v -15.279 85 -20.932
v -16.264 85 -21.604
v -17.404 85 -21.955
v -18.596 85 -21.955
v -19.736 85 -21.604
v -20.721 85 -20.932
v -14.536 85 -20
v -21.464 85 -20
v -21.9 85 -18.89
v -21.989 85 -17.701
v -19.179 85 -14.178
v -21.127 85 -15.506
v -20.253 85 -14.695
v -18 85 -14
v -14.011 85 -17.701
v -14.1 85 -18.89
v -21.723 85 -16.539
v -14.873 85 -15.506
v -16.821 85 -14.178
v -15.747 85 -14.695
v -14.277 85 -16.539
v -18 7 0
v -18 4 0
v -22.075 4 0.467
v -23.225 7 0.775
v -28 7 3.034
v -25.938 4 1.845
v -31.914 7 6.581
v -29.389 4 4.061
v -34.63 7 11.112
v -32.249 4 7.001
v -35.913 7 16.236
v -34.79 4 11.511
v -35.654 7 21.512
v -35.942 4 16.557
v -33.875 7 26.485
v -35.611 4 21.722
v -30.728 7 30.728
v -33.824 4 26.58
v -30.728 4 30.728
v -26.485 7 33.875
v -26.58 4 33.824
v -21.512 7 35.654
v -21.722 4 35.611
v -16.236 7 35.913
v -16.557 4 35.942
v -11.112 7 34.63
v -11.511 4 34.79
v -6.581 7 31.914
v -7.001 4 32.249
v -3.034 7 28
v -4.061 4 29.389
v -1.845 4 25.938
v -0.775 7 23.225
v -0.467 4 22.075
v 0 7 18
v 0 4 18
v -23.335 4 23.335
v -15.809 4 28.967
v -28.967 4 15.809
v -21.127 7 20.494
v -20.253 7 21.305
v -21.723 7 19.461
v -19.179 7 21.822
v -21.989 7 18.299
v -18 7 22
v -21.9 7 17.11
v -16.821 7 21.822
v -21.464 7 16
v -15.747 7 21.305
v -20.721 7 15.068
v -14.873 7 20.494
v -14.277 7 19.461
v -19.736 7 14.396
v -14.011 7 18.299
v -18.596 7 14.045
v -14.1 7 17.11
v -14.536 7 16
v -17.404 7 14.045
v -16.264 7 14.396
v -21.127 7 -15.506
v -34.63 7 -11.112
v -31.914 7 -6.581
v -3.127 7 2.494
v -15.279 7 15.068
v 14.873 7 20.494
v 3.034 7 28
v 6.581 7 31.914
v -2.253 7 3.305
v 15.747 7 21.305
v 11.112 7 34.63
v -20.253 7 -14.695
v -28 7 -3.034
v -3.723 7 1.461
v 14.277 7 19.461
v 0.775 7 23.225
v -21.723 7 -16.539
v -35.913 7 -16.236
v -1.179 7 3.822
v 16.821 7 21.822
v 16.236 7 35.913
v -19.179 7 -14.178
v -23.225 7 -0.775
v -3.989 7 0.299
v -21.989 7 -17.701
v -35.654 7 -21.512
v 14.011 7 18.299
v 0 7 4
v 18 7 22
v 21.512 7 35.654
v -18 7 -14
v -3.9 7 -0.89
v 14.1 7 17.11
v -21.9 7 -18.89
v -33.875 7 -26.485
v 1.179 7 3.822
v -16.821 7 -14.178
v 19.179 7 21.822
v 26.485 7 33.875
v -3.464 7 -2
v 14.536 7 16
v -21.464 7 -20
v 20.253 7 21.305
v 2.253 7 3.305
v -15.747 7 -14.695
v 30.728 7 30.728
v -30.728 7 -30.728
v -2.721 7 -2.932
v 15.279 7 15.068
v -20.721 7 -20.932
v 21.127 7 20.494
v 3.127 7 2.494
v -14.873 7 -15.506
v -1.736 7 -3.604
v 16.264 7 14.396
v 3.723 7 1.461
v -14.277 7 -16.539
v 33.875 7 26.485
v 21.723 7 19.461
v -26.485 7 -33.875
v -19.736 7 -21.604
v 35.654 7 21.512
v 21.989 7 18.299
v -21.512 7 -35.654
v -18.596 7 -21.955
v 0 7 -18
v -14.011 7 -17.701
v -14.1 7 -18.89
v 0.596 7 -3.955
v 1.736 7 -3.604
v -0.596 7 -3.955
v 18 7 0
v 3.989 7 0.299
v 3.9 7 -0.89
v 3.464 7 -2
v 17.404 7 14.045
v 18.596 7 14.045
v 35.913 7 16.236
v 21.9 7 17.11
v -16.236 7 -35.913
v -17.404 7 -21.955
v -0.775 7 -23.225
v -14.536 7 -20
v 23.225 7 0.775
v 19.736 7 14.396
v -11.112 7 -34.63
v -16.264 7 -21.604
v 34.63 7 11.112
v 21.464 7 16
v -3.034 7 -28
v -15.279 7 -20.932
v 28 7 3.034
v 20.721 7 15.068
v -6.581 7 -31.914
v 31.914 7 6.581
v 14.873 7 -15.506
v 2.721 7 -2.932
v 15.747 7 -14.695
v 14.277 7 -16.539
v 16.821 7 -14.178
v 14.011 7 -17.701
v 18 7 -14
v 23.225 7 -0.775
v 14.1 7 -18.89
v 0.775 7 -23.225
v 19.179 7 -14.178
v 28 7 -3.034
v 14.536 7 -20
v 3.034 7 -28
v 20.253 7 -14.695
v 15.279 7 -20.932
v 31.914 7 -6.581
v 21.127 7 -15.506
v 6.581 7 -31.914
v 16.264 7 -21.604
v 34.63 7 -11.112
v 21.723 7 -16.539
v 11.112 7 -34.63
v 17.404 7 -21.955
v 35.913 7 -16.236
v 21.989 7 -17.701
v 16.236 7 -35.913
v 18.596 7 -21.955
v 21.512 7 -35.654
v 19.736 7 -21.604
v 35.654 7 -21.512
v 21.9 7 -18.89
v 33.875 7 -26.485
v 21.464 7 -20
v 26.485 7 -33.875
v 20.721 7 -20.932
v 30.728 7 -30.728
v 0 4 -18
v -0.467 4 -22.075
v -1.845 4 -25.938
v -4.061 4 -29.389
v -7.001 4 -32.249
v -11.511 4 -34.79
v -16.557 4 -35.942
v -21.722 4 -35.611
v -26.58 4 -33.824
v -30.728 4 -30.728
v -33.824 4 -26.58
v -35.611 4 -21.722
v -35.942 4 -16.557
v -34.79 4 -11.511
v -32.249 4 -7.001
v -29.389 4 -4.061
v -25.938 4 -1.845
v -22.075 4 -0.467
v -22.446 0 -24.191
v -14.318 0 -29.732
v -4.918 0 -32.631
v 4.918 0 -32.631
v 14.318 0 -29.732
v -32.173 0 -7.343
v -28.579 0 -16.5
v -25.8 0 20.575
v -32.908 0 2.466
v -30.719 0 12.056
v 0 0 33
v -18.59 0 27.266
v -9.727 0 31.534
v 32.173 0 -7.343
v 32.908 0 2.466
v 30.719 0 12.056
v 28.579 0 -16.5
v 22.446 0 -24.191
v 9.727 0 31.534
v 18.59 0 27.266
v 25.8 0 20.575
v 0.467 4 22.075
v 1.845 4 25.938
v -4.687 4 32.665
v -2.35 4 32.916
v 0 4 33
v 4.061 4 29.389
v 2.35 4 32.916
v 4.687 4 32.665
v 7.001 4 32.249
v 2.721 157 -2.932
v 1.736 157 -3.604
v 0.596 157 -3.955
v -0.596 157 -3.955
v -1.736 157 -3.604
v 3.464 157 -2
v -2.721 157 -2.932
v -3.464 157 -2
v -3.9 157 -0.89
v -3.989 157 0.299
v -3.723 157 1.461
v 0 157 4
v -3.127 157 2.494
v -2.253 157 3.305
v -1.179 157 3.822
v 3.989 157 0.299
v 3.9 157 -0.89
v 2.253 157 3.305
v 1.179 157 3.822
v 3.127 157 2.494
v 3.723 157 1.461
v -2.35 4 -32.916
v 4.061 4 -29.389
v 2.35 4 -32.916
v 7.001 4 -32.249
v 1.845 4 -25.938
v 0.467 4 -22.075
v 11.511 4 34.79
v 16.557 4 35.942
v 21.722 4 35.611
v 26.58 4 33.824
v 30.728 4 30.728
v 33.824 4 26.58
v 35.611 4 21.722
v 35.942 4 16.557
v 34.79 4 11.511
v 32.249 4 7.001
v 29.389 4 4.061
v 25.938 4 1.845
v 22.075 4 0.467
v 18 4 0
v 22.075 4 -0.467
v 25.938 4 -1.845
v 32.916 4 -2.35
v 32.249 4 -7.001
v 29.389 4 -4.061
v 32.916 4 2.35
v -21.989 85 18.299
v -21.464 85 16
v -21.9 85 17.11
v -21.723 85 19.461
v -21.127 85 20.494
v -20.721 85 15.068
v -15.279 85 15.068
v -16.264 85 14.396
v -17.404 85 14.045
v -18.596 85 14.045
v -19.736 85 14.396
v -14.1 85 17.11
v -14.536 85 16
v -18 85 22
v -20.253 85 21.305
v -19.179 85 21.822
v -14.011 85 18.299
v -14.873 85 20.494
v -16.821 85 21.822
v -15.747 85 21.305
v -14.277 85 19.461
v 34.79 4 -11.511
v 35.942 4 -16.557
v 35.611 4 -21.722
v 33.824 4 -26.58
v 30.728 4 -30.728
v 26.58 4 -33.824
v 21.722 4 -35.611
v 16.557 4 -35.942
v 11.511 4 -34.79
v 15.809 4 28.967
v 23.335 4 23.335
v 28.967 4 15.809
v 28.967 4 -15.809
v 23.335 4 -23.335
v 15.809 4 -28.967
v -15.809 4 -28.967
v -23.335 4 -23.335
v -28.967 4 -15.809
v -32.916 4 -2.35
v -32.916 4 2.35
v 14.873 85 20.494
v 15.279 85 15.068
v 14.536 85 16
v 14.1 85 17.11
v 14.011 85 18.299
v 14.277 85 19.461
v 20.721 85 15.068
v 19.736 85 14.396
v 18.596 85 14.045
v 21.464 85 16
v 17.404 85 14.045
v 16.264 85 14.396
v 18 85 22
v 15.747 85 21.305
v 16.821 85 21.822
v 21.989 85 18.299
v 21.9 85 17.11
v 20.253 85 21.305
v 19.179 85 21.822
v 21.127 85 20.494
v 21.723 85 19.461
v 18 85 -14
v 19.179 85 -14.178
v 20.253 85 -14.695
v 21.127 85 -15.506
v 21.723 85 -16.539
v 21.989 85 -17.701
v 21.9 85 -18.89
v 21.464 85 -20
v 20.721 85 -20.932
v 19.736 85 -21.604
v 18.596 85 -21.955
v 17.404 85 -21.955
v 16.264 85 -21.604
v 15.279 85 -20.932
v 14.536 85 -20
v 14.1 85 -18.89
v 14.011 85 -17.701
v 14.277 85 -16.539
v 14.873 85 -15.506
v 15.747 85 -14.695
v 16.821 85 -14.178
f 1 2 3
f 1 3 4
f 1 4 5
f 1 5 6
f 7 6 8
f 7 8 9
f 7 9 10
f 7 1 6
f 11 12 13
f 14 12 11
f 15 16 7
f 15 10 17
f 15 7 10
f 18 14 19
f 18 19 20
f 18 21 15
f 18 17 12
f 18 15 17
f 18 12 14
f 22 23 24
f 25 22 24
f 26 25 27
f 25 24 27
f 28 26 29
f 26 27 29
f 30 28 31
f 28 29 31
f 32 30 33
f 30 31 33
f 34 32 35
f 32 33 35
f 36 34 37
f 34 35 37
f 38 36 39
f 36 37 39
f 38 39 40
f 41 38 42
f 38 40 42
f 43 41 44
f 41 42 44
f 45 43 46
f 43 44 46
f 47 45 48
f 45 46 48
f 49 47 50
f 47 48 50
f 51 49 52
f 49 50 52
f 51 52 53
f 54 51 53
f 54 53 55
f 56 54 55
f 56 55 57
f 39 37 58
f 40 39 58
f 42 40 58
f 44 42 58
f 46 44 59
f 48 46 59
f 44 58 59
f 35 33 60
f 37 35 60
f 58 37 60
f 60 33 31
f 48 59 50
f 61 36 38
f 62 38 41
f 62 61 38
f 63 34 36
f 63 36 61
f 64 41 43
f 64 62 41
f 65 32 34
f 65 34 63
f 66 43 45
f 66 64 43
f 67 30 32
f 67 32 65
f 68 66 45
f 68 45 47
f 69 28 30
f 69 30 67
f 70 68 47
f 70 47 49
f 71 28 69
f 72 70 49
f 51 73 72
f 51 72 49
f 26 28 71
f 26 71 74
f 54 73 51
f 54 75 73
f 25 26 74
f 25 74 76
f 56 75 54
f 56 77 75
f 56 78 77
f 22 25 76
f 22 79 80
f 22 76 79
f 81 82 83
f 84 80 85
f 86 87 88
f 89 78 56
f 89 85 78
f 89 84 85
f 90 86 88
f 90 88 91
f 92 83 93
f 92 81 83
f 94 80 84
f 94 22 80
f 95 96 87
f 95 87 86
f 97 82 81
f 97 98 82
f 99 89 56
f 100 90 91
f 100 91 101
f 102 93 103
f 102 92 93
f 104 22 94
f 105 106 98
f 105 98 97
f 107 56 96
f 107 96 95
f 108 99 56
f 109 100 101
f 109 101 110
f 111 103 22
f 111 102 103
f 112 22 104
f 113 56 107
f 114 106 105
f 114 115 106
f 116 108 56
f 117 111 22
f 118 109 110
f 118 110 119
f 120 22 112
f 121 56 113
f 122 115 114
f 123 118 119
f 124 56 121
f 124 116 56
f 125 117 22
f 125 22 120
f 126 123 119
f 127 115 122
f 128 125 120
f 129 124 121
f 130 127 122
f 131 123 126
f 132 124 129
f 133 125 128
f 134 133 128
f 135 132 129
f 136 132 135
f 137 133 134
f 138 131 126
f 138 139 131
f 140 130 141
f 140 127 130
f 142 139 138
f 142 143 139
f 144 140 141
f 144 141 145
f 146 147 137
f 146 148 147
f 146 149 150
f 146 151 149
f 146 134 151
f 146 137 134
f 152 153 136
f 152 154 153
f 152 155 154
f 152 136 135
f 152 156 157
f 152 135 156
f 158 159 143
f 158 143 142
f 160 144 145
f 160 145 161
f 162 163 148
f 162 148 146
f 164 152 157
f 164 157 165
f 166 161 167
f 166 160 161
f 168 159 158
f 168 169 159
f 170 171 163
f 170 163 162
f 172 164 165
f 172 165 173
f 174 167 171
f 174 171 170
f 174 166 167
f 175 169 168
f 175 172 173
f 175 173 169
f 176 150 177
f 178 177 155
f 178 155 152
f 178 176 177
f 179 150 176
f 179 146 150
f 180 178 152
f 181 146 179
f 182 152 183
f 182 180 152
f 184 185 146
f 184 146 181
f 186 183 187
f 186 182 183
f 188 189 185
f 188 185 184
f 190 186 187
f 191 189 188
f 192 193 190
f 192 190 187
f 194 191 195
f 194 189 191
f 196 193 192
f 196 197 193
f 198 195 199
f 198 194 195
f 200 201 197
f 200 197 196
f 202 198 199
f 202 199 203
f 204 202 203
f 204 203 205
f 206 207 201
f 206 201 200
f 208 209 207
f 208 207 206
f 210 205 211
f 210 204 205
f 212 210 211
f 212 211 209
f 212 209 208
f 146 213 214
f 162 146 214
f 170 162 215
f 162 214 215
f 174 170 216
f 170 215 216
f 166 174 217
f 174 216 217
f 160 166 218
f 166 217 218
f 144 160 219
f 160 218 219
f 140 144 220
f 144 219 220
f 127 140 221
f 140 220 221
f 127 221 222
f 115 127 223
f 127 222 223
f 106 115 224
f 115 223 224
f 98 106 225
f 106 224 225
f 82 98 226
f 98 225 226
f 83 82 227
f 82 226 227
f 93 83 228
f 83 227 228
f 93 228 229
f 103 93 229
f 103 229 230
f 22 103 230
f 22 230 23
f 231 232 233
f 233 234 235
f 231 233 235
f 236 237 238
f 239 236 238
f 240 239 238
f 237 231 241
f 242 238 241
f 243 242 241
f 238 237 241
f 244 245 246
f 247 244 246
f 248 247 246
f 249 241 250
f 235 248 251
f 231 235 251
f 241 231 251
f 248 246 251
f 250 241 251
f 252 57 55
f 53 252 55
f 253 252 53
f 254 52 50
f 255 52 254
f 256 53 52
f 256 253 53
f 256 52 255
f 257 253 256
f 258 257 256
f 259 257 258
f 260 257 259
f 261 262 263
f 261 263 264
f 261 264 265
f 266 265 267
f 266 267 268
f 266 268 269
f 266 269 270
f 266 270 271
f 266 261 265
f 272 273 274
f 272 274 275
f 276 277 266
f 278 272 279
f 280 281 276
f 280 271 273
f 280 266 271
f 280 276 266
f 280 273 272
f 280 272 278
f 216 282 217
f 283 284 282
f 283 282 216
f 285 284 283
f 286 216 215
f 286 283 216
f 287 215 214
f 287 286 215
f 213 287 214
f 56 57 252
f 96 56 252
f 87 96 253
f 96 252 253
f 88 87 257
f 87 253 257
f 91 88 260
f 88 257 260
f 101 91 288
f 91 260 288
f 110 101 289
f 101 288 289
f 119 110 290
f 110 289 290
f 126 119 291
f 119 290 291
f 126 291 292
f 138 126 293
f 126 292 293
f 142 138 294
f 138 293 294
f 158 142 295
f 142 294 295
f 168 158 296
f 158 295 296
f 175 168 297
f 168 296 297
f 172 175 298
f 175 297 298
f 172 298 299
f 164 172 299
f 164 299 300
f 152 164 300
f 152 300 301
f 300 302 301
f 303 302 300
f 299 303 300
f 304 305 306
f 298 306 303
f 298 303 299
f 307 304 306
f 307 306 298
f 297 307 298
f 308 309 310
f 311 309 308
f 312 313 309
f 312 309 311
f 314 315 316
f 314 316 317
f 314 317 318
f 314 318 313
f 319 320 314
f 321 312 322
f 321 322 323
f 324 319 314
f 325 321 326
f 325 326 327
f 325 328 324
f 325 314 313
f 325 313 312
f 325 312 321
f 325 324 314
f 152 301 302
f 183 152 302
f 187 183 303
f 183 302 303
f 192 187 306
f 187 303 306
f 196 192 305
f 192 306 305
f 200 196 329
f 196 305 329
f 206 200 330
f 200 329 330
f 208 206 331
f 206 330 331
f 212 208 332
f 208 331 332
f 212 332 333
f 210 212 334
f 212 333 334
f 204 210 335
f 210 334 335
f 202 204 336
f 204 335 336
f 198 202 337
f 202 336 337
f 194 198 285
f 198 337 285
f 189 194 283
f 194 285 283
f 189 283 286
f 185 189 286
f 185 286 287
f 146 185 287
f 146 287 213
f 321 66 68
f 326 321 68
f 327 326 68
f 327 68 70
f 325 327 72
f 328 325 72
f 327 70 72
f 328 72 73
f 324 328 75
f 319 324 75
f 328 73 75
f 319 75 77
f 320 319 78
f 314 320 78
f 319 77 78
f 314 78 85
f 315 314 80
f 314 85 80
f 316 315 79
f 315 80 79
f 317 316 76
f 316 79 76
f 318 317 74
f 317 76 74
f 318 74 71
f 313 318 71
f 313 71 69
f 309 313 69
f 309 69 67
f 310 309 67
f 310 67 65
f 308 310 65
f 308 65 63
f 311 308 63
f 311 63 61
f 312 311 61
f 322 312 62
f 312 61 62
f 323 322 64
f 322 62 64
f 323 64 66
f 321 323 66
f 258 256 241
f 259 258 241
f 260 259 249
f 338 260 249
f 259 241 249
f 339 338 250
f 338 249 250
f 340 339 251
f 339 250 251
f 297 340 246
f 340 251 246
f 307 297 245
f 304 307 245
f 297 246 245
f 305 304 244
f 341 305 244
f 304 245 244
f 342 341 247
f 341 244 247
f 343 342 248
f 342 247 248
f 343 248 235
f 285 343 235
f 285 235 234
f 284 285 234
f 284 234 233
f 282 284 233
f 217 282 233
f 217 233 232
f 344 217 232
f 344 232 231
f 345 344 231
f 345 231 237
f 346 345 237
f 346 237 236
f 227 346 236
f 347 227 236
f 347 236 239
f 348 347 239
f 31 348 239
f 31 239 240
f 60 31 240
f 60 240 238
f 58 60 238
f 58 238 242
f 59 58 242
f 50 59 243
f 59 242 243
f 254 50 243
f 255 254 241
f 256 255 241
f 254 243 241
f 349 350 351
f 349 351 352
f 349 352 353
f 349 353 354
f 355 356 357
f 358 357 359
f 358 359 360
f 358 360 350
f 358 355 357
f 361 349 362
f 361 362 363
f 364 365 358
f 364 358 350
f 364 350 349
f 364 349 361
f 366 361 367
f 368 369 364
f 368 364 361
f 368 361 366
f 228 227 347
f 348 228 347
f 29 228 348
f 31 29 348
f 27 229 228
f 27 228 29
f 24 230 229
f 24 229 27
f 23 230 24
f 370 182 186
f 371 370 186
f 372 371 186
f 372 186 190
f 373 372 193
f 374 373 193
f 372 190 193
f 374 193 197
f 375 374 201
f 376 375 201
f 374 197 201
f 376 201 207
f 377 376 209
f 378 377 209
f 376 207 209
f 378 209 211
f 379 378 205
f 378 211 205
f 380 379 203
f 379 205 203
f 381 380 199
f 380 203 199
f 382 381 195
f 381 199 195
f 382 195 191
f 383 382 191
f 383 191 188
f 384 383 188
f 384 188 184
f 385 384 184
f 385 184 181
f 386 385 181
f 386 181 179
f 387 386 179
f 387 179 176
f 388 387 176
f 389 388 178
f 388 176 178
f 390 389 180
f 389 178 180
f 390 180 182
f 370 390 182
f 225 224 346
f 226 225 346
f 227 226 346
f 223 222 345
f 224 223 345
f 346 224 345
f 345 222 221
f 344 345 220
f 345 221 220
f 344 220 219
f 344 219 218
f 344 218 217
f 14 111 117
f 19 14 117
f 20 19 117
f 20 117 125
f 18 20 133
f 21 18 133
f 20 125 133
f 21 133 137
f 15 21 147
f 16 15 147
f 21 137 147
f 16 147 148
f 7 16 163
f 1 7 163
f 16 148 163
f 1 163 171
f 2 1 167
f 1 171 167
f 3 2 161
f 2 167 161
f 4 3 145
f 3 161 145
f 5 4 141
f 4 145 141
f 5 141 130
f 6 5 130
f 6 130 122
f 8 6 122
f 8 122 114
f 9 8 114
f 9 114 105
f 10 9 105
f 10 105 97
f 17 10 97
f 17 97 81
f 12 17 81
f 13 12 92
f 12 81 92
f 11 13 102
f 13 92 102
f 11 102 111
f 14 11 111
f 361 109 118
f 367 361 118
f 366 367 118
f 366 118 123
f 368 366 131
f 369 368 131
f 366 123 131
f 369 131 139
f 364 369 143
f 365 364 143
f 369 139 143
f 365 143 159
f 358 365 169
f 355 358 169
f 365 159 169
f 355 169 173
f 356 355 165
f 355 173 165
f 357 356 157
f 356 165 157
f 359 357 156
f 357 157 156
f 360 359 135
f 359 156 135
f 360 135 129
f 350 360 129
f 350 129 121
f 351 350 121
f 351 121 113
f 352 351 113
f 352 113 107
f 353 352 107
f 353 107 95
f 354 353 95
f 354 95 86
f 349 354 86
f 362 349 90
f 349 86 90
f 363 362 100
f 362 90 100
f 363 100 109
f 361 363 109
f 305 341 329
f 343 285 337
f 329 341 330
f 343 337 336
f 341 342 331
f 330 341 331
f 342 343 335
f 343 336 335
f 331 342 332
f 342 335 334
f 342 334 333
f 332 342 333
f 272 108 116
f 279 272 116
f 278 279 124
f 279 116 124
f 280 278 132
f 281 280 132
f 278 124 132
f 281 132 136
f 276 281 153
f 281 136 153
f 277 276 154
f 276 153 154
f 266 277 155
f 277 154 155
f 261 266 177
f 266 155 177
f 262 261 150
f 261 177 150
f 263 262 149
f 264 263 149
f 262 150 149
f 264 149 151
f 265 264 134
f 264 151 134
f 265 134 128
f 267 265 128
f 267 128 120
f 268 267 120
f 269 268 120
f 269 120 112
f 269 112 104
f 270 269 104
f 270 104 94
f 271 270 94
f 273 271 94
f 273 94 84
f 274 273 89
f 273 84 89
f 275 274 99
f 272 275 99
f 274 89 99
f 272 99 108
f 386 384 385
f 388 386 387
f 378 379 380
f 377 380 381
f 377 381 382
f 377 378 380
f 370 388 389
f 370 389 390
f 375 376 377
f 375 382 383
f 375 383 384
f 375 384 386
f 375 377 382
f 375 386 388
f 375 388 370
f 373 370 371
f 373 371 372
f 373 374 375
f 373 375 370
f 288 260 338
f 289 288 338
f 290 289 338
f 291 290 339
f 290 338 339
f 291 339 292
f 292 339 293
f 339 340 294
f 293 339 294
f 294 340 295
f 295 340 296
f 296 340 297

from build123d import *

# Parameters (mm, degrees)
SKETCH1_R           = 33
BOSS_EXTRUDE1_DEPTH = 4
BOSS_EXTRUDE2_DEPTH = 3
SKETCH3_R           = 4
BOSS_EXTRUDE3_DEPTH = 78
SKETCH4_R           = 4
BOSS_EXTRUDE4_DEPTH = 150


with BuildPart() as part:
    # Sketch1 → Boss-Extrude1 (new body)
    with BuildSketch(Plane(origin=(0, 0, 0), x_dir=(1, 0, 0), z_dir=(0, 1, 0))):
        with Locations(Location((0, 0, 0), (0, 0, 270))):
            Circle(SKETCH1_R)
    extrude(amount=BOSS_EXTRUDE1_DEPTH)

    # Sketch2 → Boss-Extrude2 (add)
    with BuildSketch(Plane(origin=(0, 4, 0), x_dir=(1, 0, 0), z_dir=(0, 1, 0))):
        with BuildLine():
            ThreePointArc((18, 0), (30.727922061, 30.727922061), (0, 18))
            ThreePointArc((0, 18), (-30.727922061, 30.727922061), (-18, 0))
            ThreePointArc((-18, 0), (-30.727922061, -30.727922061), (0, -18))
            ThreePointArc((0, -18), (30.727922061, -30.727922061), (18, 0))
        make_face()
    extrude(amount=BOSS_EXTRUDE2_DEPTH)

    # Sketch3 → Boss-Extrude3 (add)
    with BuildSketch(Plane(origin=(0, 7, 0), x_dir=(1, 0, 0), z_dir=(0, 1, 0))):
        with Locations(Location((-18, 18, 0), (0, 0, 270))):
            Circle(SKETCH3_R)
        with Locations(Location((18, 18, 0), (0, 0, 270))):
            Circle(SKETCH3_R)
        with Locations(Location((18, -18, 0), (0, 0, 270))):
            Circle(SKETCH3_R)
        with Locations(Location((-18, -18, 0), (0, 0, 270))):
            Circle(SKETCH3_R)
    extrude(amount=BOSS_EXTRUDE3_DEPTH)

    # Sketch4 → Boss-Extrude4 (add)
    with BuildSketch(Plane(origin=(0, 7, 0), x_dir=(1, 0, 0), z_dir=(0, 1, 0))):
        with Locations(Location((0, 0, 0), (0, 0, 270))):
            Circle(SKETCH4_R)
    extrude(amount=BOSS_EXTRUDE4_DEPTH)


solid = part.part
